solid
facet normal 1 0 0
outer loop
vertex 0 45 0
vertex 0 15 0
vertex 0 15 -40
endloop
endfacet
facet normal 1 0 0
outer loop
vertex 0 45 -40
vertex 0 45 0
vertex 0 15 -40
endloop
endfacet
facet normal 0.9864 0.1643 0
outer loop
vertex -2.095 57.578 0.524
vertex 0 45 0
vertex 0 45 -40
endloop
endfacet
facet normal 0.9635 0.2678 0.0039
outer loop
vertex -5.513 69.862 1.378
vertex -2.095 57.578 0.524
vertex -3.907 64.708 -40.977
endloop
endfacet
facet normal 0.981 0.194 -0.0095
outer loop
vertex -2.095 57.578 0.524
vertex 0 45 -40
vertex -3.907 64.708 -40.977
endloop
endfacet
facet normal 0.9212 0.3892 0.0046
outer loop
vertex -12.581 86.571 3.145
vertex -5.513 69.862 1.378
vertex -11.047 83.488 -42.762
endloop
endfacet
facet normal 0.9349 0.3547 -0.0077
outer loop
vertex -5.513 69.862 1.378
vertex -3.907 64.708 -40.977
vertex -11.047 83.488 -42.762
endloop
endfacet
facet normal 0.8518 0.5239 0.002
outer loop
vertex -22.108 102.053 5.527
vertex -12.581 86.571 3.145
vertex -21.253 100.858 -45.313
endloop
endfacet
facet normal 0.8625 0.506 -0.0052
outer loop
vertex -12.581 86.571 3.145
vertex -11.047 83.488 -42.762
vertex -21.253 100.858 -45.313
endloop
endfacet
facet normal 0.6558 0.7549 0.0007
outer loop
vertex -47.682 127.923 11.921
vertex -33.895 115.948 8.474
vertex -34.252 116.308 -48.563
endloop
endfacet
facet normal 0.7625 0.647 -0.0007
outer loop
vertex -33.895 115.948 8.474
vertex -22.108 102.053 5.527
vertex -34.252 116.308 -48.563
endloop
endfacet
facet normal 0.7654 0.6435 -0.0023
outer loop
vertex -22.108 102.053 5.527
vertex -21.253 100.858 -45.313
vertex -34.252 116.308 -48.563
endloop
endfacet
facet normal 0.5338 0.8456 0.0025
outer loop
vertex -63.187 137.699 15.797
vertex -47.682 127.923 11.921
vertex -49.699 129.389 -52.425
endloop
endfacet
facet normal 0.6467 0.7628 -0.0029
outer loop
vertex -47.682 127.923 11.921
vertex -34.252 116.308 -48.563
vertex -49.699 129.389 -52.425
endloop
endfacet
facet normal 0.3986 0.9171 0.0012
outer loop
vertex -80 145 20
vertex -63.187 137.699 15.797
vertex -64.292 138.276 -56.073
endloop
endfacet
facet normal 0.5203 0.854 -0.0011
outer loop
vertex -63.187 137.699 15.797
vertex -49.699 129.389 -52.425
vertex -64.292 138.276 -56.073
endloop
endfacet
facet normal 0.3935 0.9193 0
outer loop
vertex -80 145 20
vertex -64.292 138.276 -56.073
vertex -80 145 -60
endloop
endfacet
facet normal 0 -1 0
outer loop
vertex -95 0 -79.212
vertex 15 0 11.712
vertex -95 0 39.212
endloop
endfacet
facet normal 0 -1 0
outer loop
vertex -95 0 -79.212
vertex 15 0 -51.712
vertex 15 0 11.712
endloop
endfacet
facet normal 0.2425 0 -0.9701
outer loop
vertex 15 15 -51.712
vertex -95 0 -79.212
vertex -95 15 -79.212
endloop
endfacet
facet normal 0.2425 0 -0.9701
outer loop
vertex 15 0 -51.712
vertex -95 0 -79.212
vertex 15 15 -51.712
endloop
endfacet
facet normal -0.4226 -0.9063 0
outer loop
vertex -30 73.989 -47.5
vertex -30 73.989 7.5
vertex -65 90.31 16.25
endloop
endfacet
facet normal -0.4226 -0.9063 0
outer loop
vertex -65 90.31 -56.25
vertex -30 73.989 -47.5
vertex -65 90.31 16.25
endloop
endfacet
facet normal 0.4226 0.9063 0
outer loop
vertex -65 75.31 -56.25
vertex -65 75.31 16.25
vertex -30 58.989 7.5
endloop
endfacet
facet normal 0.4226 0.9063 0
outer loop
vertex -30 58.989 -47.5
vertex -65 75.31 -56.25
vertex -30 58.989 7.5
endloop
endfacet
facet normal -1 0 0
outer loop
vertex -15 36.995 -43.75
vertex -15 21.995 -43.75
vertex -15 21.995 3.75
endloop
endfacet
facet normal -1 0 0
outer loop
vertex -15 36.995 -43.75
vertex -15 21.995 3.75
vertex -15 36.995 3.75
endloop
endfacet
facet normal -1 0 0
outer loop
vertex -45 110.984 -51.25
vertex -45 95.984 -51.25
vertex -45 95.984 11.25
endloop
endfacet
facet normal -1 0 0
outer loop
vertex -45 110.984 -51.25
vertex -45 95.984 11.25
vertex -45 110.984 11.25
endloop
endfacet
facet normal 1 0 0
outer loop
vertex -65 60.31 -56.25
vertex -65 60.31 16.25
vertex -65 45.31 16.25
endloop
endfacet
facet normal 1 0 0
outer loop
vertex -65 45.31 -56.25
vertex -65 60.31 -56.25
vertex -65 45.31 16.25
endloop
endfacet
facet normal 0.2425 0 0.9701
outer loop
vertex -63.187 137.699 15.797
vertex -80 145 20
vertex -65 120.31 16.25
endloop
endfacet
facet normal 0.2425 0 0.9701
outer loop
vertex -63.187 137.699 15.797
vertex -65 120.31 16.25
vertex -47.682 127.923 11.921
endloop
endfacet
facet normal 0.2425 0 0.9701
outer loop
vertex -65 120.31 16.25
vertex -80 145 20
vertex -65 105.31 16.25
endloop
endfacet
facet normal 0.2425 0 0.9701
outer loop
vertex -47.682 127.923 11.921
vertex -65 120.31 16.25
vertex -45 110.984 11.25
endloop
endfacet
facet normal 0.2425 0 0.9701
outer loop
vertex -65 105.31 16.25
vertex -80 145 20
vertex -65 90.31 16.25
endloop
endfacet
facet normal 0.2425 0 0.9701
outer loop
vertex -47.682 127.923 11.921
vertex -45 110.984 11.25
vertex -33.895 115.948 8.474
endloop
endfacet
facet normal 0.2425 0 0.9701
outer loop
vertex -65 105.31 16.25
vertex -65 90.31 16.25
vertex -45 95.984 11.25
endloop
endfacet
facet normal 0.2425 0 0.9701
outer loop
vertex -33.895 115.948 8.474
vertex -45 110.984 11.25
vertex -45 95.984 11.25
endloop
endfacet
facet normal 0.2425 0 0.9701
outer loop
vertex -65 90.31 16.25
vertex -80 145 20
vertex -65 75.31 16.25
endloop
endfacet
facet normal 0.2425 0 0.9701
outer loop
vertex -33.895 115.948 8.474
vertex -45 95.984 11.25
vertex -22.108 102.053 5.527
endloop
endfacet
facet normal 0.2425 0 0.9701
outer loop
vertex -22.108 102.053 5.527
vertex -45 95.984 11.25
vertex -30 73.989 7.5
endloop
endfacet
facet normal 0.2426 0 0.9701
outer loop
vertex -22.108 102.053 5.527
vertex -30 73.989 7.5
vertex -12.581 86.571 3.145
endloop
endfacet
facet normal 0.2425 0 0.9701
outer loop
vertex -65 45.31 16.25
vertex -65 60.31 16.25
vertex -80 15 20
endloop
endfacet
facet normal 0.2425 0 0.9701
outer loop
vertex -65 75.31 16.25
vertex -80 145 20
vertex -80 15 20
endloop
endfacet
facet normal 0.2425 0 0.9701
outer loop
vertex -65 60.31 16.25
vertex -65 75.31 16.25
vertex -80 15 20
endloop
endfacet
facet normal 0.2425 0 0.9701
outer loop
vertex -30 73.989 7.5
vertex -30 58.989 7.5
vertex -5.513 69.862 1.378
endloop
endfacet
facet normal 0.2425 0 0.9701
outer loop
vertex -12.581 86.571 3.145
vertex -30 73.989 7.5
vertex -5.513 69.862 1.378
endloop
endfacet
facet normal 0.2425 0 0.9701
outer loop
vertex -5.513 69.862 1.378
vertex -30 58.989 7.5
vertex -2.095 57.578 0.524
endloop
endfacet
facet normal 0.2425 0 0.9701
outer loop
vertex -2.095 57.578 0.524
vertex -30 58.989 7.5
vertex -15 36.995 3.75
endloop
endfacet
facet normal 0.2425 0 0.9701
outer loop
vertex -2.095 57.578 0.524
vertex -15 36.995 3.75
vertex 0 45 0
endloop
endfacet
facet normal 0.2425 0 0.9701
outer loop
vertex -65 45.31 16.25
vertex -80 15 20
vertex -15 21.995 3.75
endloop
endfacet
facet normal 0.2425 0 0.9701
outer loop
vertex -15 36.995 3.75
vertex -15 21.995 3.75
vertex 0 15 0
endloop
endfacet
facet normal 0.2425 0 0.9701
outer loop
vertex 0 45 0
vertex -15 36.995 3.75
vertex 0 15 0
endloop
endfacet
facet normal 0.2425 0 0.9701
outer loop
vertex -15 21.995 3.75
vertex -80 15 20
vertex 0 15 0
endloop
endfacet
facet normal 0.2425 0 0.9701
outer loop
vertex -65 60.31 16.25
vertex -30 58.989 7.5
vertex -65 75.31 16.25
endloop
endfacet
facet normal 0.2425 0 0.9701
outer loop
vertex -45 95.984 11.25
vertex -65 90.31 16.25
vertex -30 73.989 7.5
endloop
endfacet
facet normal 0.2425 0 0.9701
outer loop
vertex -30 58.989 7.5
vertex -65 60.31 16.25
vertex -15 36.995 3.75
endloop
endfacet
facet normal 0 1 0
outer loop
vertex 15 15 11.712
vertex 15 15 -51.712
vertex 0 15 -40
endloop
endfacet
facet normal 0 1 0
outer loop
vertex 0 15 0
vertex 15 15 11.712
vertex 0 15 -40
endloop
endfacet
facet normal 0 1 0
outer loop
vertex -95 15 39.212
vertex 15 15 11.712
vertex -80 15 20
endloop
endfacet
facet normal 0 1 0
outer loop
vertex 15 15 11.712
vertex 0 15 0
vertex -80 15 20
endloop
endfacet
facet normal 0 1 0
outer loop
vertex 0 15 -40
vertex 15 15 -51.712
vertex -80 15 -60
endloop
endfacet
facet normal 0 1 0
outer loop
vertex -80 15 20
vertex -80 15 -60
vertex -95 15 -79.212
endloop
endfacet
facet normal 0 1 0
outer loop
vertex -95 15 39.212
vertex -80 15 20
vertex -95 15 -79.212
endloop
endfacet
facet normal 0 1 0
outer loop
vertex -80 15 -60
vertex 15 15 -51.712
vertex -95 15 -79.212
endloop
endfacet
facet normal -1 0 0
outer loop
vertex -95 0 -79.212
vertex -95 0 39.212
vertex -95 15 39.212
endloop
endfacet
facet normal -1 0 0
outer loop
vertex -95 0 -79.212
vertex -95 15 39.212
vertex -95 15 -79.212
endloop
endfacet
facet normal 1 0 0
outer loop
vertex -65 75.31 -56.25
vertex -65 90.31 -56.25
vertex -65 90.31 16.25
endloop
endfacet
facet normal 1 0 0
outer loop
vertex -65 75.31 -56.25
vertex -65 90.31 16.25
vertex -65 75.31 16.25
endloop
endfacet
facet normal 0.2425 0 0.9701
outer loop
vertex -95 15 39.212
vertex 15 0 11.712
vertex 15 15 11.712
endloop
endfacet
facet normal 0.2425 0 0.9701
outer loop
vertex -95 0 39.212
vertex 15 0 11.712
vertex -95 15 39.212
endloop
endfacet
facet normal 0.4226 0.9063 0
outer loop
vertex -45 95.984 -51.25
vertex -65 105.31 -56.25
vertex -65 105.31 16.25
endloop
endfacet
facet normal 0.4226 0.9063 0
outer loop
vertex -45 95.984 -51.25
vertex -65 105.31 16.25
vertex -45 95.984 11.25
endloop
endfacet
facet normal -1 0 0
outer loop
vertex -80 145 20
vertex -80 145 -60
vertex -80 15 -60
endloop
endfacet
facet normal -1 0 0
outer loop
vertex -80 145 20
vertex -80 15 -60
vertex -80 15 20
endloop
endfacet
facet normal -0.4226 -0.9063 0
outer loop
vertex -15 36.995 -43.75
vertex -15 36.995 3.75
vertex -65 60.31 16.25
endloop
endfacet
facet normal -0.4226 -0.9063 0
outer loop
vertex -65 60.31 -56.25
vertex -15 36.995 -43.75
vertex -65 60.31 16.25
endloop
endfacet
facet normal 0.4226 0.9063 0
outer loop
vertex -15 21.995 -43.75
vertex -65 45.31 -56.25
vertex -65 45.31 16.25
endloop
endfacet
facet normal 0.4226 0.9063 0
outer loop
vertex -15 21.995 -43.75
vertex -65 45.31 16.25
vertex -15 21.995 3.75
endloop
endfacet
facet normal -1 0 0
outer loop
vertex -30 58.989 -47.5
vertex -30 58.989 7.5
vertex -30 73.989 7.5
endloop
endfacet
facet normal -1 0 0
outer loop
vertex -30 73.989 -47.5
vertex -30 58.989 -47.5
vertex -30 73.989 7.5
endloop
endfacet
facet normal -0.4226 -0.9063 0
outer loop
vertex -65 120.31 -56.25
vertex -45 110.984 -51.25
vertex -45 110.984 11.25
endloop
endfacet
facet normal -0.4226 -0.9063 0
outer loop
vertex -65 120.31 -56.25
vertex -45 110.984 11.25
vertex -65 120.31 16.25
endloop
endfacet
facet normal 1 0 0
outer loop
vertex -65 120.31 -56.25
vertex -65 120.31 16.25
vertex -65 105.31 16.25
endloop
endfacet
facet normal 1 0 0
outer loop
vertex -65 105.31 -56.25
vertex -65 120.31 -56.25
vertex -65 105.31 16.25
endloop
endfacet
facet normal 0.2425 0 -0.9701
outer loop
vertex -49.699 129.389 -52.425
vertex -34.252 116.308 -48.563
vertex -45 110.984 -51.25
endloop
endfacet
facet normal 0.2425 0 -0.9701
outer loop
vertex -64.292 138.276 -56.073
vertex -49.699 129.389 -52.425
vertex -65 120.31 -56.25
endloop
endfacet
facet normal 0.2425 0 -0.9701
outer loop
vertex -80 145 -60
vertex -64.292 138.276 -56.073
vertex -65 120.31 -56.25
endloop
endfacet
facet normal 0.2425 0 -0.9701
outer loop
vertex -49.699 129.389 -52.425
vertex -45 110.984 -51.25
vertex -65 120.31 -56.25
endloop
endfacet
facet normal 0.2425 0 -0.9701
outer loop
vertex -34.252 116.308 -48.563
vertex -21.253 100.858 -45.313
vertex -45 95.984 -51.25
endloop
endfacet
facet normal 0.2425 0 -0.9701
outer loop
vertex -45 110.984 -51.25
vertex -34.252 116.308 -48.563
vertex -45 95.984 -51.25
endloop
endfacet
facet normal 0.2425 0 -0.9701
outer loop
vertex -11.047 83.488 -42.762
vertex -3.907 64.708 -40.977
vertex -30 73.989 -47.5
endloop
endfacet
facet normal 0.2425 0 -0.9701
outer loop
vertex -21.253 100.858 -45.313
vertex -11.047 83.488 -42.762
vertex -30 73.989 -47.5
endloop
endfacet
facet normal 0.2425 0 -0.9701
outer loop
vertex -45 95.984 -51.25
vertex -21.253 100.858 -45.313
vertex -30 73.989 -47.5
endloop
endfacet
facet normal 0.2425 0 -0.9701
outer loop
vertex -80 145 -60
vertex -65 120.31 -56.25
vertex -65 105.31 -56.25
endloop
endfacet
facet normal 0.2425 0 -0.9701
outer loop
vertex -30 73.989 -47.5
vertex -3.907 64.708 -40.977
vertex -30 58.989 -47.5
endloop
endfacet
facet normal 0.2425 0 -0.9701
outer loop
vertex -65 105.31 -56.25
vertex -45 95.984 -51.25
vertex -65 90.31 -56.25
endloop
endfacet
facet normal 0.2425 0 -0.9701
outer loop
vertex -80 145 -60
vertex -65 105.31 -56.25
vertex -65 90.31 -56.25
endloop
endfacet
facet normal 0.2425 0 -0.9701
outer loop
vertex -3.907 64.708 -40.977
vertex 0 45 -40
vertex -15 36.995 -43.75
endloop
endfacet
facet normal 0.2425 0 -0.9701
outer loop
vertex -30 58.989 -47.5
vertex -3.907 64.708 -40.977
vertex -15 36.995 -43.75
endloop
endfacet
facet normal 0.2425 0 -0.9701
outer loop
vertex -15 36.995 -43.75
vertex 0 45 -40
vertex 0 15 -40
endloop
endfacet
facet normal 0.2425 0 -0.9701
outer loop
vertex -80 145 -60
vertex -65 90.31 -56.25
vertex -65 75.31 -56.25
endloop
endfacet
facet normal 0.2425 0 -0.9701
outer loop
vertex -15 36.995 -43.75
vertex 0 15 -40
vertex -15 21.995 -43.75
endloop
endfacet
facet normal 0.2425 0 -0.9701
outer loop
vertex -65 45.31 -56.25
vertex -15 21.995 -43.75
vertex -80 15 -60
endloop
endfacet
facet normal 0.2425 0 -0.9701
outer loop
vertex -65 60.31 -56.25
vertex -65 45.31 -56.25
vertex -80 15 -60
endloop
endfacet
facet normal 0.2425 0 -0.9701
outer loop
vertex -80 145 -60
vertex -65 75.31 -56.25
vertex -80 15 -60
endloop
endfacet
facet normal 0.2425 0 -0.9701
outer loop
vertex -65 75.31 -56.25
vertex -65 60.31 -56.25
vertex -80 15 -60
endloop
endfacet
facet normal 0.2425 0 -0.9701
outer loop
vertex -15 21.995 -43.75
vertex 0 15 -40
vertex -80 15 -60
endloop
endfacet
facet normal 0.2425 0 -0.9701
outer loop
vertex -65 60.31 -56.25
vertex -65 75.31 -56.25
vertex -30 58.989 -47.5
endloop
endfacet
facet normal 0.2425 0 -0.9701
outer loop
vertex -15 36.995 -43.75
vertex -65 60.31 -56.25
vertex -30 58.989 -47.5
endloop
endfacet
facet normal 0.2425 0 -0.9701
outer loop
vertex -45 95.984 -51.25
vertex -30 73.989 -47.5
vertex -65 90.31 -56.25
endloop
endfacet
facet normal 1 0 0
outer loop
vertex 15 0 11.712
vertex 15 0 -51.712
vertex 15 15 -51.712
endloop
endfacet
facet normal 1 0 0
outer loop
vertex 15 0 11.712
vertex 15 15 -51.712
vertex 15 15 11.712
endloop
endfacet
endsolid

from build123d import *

# Parameters (mm, degrees)
EXTRUDE1_DEPTH = 15
EXTRUDE2_DEPTH = 130
EXTRUDE3_DEPTH = 65


with BuildPart() as part:
    # Sketch1 → Extrude1 (new body)
    with BuildSketch(Plane(origin=(0, 0, 0), x_dir=(1, 0, 0), z_dir=(0, 1, 0))):
        Polygon((15, -11.711646096), (-95, -39.211646096), (-95, 79.211646096), (15, 51.711646096), align=None)
    extrude(amount=EXTRUDE1_DEPTH)

    # Sketch2 → Extrude2 (add)
    with BuildSketch(Plane(origin=(0, 15, 0), x_dir=(1, 0, 0), z_dir=(0, 1, 0))):
        Polygon((0, 0), (0, 40), (-80, 60), (-80, -20), align=None)
    extrude(amount=EXTRUDE2_DEPTH)

    # Sketch3 → Extrude3 (cut, symmetric)
    with BuildSketch(Plane.XY):
        with BuildLine():
            Line((-80, 145), (0, 145))
            Line((0, 145), (0, 45))
            ThreePointArc((0, 45), (-25.545271603, 106.563782718), (-80, 145))
        make_face()
        Polygon((-65, 120.30999778), (-65, 105.30999778), (-45, 95.983844617), (-45, 110.983844617), align=None)
        Polygon((-65, 45.30999778), (-15, 21.994614872), (-15, 36.994614872), (-65, 60.30999778), align=None)
        Polygon((-65, 75.30999778), (-30, 58.989229745), (-30, 73.989229745), (-65, 90.30999778), align=None)
    extrude(amount=EXTRUDE3_DEPTH, both=True, mode=Mode.SUBTRACT)


solid = part.part
